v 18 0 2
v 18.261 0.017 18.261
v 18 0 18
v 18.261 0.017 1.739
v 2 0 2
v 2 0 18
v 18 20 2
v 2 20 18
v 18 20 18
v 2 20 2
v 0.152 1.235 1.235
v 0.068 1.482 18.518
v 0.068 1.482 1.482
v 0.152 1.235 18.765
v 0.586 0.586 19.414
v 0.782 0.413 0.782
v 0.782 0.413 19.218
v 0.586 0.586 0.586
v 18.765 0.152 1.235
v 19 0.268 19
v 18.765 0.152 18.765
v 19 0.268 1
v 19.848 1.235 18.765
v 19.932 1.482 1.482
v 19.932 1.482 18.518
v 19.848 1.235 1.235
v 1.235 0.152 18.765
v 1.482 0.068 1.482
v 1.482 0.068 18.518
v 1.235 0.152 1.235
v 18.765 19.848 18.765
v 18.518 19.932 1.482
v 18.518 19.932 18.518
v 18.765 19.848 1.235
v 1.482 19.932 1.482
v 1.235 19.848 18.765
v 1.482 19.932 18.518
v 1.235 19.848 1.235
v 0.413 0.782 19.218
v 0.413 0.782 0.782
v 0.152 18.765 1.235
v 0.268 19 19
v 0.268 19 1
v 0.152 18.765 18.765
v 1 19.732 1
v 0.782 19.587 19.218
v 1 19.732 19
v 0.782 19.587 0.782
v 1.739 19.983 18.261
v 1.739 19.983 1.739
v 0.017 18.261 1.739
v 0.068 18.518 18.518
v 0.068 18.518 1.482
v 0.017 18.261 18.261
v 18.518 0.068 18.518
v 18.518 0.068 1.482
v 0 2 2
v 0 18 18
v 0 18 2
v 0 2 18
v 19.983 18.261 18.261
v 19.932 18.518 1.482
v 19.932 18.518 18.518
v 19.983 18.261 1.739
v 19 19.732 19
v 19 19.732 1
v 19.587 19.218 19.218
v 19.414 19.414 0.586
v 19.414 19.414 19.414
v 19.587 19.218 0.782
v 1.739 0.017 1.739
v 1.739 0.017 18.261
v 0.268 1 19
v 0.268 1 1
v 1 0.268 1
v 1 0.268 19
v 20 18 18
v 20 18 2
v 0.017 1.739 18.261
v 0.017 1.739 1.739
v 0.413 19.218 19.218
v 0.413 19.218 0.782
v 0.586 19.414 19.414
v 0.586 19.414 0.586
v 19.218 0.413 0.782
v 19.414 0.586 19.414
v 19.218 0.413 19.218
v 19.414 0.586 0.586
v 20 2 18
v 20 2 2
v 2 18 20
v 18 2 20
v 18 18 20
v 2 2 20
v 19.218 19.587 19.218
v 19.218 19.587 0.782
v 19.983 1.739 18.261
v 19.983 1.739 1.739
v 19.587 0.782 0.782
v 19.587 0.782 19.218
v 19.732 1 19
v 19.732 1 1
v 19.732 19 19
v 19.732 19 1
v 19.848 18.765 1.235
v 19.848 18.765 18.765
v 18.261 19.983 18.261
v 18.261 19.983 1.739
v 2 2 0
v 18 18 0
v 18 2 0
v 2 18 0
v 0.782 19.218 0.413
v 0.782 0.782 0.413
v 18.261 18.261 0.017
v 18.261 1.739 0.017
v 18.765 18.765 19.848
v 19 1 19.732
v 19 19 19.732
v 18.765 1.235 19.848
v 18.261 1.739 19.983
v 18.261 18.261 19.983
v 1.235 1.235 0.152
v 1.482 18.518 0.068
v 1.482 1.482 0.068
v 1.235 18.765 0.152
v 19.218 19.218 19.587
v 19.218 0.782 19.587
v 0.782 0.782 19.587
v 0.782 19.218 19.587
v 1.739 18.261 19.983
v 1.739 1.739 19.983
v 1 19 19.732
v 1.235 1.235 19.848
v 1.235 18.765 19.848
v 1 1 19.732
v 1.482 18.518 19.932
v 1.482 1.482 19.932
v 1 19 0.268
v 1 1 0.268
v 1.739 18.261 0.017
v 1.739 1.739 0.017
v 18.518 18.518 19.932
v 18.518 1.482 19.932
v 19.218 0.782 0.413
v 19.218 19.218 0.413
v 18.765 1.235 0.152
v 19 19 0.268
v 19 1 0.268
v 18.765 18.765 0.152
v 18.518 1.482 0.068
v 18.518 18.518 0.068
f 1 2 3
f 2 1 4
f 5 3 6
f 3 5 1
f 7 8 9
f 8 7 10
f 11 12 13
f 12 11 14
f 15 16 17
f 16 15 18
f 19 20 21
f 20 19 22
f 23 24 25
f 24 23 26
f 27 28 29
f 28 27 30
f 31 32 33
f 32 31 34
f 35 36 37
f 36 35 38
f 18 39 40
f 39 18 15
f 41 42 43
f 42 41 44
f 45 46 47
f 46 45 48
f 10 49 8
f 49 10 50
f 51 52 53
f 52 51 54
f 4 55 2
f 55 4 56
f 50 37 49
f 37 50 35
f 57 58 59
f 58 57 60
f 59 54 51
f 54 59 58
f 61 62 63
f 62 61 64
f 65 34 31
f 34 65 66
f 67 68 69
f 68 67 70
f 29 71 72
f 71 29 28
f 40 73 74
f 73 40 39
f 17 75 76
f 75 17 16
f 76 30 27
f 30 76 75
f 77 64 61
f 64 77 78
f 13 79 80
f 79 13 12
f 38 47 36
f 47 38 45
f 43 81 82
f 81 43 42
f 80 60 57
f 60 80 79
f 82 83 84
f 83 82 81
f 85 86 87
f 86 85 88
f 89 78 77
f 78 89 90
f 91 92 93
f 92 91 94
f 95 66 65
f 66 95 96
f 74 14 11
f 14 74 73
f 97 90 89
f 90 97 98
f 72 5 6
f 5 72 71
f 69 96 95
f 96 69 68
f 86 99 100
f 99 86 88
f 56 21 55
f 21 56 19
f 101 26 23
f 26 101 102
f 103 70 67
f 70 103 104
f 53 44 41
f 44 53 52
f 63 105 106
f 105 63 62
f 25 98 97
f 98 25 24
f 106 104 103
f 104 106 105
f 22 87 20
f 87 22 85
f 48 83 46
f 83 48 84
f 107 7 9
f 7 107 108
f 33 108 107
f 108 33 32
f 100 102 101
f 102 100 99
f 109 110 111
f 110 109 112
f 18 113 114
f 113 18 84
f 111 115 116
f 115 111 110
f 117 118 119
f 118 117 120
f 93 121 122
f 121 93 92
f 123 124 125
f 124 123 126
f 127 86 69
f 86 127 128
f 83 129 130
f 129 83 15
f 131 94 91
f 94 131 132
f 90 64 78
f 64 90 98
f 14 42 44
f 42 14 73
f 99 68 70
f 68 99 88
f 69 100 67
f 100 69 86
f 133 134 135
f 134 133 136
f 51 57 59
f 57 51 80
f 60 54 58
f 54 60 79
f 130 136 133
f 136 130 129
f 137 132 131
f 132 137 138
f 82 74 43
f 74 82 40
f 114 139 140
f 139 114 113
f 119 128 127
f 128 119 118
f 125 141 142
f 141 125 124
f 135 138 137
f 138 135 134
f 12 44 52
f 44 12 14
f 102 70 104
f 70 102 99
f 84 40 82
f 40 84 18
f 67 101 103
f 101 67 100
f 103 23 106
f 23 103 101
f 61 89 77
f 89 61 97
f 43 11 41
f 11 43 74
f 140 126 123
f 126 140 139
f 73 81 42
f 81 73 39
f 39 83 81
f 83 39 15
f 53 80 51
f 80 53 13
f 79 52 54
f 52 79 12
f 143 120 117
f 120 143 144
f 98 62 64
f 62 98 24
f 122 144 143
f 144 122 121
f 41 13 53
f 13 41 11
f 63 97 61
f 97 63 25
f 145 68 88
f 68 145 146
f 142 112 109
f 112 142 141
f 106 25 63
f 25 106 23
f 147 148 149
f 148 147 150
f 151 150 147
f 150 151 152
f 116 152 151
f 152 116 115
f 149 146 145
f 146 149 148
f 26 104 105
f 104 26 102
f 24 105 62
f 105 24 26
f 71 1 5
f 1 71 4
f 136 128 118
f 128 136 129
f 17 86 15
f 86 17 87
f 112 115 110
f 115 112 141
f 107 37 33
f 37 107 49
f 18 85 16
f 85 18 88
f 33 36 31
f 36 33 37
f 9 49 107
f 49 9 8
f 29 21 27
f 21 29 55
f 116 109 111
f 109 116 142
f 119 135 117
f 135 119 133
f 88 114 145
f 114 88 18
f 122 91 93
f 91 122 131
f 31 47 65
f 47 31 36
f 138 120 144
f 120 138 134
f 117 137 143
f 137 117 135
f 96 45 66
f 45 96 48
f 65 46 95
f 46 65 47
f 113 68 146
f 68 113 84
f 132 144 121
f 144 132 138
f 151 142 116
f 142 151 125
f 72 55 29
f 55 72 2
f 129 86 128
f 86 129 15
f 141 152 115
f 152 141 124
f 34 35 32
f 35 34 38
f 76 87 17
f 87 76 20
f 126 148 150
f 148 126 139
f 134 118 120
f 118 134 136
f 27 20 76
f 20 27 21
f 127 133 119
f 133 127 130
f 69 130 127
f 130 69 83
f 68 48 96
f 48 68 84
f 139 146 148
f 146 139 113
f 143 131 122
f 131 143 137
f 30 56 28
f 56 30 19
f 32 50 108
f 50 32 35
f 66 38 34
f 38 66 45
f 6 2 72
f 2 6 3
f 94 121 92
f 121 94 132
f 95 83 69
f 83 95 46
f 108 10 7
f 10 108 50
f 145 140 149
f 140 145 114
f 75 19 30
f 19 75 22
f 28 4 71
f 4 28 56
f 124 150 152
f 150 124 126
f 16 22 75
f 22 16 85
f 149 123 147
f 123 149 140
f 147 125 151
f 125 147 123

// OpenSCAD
// Custom dice — a six-sided die with rounded edges and its faces inlaid in a
// second colour: standard pips, numbers, your own words (an activity die:
// HOP, JUMP, SPIN ...) or six simple picture shapes.
//
// Faces are flush inlays: each face pattern is cut into the die and filled
// with the face colour, so nothing stands proud and nothing needs supports.
// Face 1 is on top and face 6 on the bed (its inlay prints as the first
// layers); 2 faces the front, 5 the back, 3 the right, 4 the left, so
// opposite faces add up to 7.
//
// Written to the MakerWorld Parametric Model Maker customizer conventions so
// the same file works unchanged on MakerWorld and in ScadBuddy.
//
// The two colour parameters are the extruder order: die_color is extruder 1,
// face_color is extruder 2.

/* [Die] */

// Edge length of the die in mm
size = 20; // [12:1:40]

// Radius of the rounded edges (capped at a fifth of the size)
rounding = 2; // [0:0.5:5]

// What goes on the faces
faces = "pips"; // [pips:Pips, numbers:Numbers, custom_text:Custom words, emoji_shapes:Picture shapes]

// Face 1 word (top), custom words only
face_1 = "HOP"; // 8

// Face 2 word (front)
face_2 = "JUMP"; // 8

// Face 3 word (right)
face_3 = "SPIN"; // 8

// Face 4 word (left)
face_4 = "CLAP"; // 8

// Face 5 word (back)
face_5 = "SING"; // 8

// Face 6 word (bottom)
face_6 = "DANCE"; // 8

// Typeface for numbers and words
font = "DejaVu Sans:style=Bold"; // font

// Depth of the face inlays
inlay_depth = 0.8; // [0.4:0.2:2]

/* [Batch] */

// How many dice to put on the plate
count = 1; // [1:1:6]

/* [Colours] */

// Die body (extruder 1)
die_color = "#FFF3E0"; // color

// Pips, numbers, words and shapes (extruder 2)
face_color = "#D81B60"; // color

/* [Hidden] */

$fn = 48;

part_gap = 6;                       // gap between dice on the plate
r = min(rounding, size / 5);        // effective edge radius
content = size * 0.72;              // face artwork box
pip_step = size * 0.25;             // pip grid spacing
pip_d = size * 0.17;                // pip diameter
words = [face_1, face_2, face_3, face_4, face_5, face_6];
shapes = ["heart", "star", "moon", "sun", "cloud", "lightning"];

// ------------------------------------------------------------ body

module rounded_square(w) {
    if (r > 0) offset(r = r) square(w - 2 * r, center = true);
    else square(w, center = true);
}

// Intersection of three rounded-square prisms: every edge is rounded, the
// outside is exactly size x size x size, and it is quick to render.
module body() {
    translate([0, 0, size / 2])
        intersection() {
            linear_extrude(size, center = true) rounded_square(size);
            rotate([90, 0, 0]) linear_extrude(size, center = true) rounded_square(size);
            rotate([0, 90, 0]) linear_extrude(size, center = true) rounded_square(size);
        }
}

// ------------------------------------------------------------ face artwork

// Shrink-only fit (as in name-sign): resize() to the box of the children
// plus a hair-thin bar of the target length, so small text is left alone and
// long text is scaled down uniformly.
module fit_x(w) {
    projection(cut = true) translate([0, 0, -0.5])
        resize([w, 0, 0], auto = [false, true, false])
            union() {
                linear_extrude(1) children();
                translate([-w / 2, 0, 10]) cube([w, 0.01, 0.01]);
            }
}

module word_2d(s) {
    if (len(s) > 0)
        fit_x(content)
            text(s, size = size * 0.26, font = font, halign = "center", valign = "center");
}

module number_2d(k) {
    text(str(k), size = size * 0.5, font = font, halign = "center", valign = "center");
    // Underline the 6 so it cannot be read as a 9.
    if (k == 6) translate([0, -size * 0.34]) offset(r = size * 0.02)
        square([size * 0.26, size * 0.03], center = true);
}

function pips(k) =
      k == 1 ? [[0, 0]]
    : k == 2 ? [[-1, 1], [1, -1]]
    : k == 3 ? [[-1, 1], [0, 0], [1, -1]]
    : k == 4 ? [[-1, -1], [-1, 1], [1, -1], [1, 1]]
    : k == 5 ? [[-1, -1], [-1, 1], [1, -1], [1, 1], [0, 0]]
    :          [[-1, -1], [-1, 0], [-1, 1], [1, -1], [1, 0], [1, 1]];

module pips_2d(k) {
    for (p = pips(k)) translate(p * pip_step) circle(d = pip_d);
}

// Picture shapes, drawn in a unit box and scaled to the artwork box. All
// convex corners are rounded.
module heart_2d() {
    for (m = [0, 1]) mirror([m, 0])
        hull() {
            translate([-0.23, 0.17]) circle(r = 0.27);
            translate([0, -0.42]) circle(r = 0.05);
        }
}

module star_2d() {
    offset(r = 0.06) offset(delta = -0.06)
        polygon([for (i = [0 : 9]) let(a = 90 + i * 36, rr = i % 2 == 0 ? 0.53 : 0.25)
                 [rr * cos(a), rr * sin(a) - 0.03]]);
}

module moon_2d() {
    offset(r = 0.05) offset(delta = -0.05)
        difference() {
            circle(r = 0.48);
            translate([0.24, 0.14]) circle(r = 0.4);
        }
}

module sun_2d() {
    circle(r = 0.25);
    for (a = [0 : 45 : 315]) rotate(a)
        hull() {
            translate([0.34, 0]) circle(d = 0.1);
            translate([0.46, 0]) circle(d = 0.1);
        }
}

module cloud_2d() {
    translate([0, -0.08]) {
        translate([-0.24, 0]) circle(r = 0.2);
        translate([0.02, 0.12]) circle(r = 0.26);
        translate([0.26, 0.01]) circle(r = 0.19);
        hull() {
            translate([-0.34, -0.06]) circle(r = 0.12);
            translate([0.36, -0.06]) circle(r = 0.12);
        }
    }
}

module lightning_2d() {
    scale([1.35, 1]) offset(r = 0.04) offset(delta = -0.04)
        polygon([[0.14, 0.5], [-0.3, -0.02], [-0.02, -0.02], [-0.14, -0.5],
                 [0.32, 0.1], [0.04, 0.1]]);
}

module shape_2d(k) {
    n = shapes[k - 1];
    scale(content)
        if (n == "heart") heart_2d();
        else if (n == "star") star_2d();
        else if (n == "moon") moon_2d();
        else if (n == "sun") sun_2d();
        else if (n == "cloud") cloud_2d();
        else lightning_2d();
}

module art_2d(k) {
    if (faces == "pips") pips_2d(k);
    else if (faces == "numbers") number_2d(k);
    else if (faces == "custom_text") word_2d(words[k - 1]);
    else shape_2d(k);
}

function has_art(k) = faces != "custom_text" || len(words[k - 1]) > 0;

// ------------------------------------------------------------ faces

// Place 2D artwork on face k, reading upright from outside the die, as a
// prism starting inlay_depth under the surface and running well outside it.
module on_face(k) {
    e = inlay_depth + size;
    translate([0, 0, size / 2])
        if (k == 1) translate([0, 0, size / 2 - inlay_depth]) linear_extrude(e) children();
        else if (k == 6) translate([0, 0, -size / 2 + inlay_depth]) mirror([0, 0, 1])
                             mirror([1, 0, 0]) linear_extrude(e) children();
        else rotate([90, 0, k == 2 ? 0 : k == 5 ? 180 : k == 3 ? 90 : -90])
                 translate([0, 0, size / 2 - inlay_depth]) linear_extrude(e) children();
}

module inlays() {
    intersection() {
        body();
        union() for (k = [1 : 6]) if (has_art(k)) on_face(k) art_2d(k);
    }
}

module die() {
    color(die_color)
        difference() {
            body();
            for (k = [1 : 6]) if (has_art(k)) on_face(k) art_2d(k);
        }
    if (len([for (k = [1 : 6]) if (has_art(k)) k]) > 0)
        color(face_color) inlays();
}

// Up to three in a row, then a second row.
cols = min(count, 3);
for (i = [0 : count - 1])
    translate([(i % cols) * (size + part_gap), floor(i / cols) * (size + part_gap), 0])
        translate([size / 2, size / 2, 0]) die();
